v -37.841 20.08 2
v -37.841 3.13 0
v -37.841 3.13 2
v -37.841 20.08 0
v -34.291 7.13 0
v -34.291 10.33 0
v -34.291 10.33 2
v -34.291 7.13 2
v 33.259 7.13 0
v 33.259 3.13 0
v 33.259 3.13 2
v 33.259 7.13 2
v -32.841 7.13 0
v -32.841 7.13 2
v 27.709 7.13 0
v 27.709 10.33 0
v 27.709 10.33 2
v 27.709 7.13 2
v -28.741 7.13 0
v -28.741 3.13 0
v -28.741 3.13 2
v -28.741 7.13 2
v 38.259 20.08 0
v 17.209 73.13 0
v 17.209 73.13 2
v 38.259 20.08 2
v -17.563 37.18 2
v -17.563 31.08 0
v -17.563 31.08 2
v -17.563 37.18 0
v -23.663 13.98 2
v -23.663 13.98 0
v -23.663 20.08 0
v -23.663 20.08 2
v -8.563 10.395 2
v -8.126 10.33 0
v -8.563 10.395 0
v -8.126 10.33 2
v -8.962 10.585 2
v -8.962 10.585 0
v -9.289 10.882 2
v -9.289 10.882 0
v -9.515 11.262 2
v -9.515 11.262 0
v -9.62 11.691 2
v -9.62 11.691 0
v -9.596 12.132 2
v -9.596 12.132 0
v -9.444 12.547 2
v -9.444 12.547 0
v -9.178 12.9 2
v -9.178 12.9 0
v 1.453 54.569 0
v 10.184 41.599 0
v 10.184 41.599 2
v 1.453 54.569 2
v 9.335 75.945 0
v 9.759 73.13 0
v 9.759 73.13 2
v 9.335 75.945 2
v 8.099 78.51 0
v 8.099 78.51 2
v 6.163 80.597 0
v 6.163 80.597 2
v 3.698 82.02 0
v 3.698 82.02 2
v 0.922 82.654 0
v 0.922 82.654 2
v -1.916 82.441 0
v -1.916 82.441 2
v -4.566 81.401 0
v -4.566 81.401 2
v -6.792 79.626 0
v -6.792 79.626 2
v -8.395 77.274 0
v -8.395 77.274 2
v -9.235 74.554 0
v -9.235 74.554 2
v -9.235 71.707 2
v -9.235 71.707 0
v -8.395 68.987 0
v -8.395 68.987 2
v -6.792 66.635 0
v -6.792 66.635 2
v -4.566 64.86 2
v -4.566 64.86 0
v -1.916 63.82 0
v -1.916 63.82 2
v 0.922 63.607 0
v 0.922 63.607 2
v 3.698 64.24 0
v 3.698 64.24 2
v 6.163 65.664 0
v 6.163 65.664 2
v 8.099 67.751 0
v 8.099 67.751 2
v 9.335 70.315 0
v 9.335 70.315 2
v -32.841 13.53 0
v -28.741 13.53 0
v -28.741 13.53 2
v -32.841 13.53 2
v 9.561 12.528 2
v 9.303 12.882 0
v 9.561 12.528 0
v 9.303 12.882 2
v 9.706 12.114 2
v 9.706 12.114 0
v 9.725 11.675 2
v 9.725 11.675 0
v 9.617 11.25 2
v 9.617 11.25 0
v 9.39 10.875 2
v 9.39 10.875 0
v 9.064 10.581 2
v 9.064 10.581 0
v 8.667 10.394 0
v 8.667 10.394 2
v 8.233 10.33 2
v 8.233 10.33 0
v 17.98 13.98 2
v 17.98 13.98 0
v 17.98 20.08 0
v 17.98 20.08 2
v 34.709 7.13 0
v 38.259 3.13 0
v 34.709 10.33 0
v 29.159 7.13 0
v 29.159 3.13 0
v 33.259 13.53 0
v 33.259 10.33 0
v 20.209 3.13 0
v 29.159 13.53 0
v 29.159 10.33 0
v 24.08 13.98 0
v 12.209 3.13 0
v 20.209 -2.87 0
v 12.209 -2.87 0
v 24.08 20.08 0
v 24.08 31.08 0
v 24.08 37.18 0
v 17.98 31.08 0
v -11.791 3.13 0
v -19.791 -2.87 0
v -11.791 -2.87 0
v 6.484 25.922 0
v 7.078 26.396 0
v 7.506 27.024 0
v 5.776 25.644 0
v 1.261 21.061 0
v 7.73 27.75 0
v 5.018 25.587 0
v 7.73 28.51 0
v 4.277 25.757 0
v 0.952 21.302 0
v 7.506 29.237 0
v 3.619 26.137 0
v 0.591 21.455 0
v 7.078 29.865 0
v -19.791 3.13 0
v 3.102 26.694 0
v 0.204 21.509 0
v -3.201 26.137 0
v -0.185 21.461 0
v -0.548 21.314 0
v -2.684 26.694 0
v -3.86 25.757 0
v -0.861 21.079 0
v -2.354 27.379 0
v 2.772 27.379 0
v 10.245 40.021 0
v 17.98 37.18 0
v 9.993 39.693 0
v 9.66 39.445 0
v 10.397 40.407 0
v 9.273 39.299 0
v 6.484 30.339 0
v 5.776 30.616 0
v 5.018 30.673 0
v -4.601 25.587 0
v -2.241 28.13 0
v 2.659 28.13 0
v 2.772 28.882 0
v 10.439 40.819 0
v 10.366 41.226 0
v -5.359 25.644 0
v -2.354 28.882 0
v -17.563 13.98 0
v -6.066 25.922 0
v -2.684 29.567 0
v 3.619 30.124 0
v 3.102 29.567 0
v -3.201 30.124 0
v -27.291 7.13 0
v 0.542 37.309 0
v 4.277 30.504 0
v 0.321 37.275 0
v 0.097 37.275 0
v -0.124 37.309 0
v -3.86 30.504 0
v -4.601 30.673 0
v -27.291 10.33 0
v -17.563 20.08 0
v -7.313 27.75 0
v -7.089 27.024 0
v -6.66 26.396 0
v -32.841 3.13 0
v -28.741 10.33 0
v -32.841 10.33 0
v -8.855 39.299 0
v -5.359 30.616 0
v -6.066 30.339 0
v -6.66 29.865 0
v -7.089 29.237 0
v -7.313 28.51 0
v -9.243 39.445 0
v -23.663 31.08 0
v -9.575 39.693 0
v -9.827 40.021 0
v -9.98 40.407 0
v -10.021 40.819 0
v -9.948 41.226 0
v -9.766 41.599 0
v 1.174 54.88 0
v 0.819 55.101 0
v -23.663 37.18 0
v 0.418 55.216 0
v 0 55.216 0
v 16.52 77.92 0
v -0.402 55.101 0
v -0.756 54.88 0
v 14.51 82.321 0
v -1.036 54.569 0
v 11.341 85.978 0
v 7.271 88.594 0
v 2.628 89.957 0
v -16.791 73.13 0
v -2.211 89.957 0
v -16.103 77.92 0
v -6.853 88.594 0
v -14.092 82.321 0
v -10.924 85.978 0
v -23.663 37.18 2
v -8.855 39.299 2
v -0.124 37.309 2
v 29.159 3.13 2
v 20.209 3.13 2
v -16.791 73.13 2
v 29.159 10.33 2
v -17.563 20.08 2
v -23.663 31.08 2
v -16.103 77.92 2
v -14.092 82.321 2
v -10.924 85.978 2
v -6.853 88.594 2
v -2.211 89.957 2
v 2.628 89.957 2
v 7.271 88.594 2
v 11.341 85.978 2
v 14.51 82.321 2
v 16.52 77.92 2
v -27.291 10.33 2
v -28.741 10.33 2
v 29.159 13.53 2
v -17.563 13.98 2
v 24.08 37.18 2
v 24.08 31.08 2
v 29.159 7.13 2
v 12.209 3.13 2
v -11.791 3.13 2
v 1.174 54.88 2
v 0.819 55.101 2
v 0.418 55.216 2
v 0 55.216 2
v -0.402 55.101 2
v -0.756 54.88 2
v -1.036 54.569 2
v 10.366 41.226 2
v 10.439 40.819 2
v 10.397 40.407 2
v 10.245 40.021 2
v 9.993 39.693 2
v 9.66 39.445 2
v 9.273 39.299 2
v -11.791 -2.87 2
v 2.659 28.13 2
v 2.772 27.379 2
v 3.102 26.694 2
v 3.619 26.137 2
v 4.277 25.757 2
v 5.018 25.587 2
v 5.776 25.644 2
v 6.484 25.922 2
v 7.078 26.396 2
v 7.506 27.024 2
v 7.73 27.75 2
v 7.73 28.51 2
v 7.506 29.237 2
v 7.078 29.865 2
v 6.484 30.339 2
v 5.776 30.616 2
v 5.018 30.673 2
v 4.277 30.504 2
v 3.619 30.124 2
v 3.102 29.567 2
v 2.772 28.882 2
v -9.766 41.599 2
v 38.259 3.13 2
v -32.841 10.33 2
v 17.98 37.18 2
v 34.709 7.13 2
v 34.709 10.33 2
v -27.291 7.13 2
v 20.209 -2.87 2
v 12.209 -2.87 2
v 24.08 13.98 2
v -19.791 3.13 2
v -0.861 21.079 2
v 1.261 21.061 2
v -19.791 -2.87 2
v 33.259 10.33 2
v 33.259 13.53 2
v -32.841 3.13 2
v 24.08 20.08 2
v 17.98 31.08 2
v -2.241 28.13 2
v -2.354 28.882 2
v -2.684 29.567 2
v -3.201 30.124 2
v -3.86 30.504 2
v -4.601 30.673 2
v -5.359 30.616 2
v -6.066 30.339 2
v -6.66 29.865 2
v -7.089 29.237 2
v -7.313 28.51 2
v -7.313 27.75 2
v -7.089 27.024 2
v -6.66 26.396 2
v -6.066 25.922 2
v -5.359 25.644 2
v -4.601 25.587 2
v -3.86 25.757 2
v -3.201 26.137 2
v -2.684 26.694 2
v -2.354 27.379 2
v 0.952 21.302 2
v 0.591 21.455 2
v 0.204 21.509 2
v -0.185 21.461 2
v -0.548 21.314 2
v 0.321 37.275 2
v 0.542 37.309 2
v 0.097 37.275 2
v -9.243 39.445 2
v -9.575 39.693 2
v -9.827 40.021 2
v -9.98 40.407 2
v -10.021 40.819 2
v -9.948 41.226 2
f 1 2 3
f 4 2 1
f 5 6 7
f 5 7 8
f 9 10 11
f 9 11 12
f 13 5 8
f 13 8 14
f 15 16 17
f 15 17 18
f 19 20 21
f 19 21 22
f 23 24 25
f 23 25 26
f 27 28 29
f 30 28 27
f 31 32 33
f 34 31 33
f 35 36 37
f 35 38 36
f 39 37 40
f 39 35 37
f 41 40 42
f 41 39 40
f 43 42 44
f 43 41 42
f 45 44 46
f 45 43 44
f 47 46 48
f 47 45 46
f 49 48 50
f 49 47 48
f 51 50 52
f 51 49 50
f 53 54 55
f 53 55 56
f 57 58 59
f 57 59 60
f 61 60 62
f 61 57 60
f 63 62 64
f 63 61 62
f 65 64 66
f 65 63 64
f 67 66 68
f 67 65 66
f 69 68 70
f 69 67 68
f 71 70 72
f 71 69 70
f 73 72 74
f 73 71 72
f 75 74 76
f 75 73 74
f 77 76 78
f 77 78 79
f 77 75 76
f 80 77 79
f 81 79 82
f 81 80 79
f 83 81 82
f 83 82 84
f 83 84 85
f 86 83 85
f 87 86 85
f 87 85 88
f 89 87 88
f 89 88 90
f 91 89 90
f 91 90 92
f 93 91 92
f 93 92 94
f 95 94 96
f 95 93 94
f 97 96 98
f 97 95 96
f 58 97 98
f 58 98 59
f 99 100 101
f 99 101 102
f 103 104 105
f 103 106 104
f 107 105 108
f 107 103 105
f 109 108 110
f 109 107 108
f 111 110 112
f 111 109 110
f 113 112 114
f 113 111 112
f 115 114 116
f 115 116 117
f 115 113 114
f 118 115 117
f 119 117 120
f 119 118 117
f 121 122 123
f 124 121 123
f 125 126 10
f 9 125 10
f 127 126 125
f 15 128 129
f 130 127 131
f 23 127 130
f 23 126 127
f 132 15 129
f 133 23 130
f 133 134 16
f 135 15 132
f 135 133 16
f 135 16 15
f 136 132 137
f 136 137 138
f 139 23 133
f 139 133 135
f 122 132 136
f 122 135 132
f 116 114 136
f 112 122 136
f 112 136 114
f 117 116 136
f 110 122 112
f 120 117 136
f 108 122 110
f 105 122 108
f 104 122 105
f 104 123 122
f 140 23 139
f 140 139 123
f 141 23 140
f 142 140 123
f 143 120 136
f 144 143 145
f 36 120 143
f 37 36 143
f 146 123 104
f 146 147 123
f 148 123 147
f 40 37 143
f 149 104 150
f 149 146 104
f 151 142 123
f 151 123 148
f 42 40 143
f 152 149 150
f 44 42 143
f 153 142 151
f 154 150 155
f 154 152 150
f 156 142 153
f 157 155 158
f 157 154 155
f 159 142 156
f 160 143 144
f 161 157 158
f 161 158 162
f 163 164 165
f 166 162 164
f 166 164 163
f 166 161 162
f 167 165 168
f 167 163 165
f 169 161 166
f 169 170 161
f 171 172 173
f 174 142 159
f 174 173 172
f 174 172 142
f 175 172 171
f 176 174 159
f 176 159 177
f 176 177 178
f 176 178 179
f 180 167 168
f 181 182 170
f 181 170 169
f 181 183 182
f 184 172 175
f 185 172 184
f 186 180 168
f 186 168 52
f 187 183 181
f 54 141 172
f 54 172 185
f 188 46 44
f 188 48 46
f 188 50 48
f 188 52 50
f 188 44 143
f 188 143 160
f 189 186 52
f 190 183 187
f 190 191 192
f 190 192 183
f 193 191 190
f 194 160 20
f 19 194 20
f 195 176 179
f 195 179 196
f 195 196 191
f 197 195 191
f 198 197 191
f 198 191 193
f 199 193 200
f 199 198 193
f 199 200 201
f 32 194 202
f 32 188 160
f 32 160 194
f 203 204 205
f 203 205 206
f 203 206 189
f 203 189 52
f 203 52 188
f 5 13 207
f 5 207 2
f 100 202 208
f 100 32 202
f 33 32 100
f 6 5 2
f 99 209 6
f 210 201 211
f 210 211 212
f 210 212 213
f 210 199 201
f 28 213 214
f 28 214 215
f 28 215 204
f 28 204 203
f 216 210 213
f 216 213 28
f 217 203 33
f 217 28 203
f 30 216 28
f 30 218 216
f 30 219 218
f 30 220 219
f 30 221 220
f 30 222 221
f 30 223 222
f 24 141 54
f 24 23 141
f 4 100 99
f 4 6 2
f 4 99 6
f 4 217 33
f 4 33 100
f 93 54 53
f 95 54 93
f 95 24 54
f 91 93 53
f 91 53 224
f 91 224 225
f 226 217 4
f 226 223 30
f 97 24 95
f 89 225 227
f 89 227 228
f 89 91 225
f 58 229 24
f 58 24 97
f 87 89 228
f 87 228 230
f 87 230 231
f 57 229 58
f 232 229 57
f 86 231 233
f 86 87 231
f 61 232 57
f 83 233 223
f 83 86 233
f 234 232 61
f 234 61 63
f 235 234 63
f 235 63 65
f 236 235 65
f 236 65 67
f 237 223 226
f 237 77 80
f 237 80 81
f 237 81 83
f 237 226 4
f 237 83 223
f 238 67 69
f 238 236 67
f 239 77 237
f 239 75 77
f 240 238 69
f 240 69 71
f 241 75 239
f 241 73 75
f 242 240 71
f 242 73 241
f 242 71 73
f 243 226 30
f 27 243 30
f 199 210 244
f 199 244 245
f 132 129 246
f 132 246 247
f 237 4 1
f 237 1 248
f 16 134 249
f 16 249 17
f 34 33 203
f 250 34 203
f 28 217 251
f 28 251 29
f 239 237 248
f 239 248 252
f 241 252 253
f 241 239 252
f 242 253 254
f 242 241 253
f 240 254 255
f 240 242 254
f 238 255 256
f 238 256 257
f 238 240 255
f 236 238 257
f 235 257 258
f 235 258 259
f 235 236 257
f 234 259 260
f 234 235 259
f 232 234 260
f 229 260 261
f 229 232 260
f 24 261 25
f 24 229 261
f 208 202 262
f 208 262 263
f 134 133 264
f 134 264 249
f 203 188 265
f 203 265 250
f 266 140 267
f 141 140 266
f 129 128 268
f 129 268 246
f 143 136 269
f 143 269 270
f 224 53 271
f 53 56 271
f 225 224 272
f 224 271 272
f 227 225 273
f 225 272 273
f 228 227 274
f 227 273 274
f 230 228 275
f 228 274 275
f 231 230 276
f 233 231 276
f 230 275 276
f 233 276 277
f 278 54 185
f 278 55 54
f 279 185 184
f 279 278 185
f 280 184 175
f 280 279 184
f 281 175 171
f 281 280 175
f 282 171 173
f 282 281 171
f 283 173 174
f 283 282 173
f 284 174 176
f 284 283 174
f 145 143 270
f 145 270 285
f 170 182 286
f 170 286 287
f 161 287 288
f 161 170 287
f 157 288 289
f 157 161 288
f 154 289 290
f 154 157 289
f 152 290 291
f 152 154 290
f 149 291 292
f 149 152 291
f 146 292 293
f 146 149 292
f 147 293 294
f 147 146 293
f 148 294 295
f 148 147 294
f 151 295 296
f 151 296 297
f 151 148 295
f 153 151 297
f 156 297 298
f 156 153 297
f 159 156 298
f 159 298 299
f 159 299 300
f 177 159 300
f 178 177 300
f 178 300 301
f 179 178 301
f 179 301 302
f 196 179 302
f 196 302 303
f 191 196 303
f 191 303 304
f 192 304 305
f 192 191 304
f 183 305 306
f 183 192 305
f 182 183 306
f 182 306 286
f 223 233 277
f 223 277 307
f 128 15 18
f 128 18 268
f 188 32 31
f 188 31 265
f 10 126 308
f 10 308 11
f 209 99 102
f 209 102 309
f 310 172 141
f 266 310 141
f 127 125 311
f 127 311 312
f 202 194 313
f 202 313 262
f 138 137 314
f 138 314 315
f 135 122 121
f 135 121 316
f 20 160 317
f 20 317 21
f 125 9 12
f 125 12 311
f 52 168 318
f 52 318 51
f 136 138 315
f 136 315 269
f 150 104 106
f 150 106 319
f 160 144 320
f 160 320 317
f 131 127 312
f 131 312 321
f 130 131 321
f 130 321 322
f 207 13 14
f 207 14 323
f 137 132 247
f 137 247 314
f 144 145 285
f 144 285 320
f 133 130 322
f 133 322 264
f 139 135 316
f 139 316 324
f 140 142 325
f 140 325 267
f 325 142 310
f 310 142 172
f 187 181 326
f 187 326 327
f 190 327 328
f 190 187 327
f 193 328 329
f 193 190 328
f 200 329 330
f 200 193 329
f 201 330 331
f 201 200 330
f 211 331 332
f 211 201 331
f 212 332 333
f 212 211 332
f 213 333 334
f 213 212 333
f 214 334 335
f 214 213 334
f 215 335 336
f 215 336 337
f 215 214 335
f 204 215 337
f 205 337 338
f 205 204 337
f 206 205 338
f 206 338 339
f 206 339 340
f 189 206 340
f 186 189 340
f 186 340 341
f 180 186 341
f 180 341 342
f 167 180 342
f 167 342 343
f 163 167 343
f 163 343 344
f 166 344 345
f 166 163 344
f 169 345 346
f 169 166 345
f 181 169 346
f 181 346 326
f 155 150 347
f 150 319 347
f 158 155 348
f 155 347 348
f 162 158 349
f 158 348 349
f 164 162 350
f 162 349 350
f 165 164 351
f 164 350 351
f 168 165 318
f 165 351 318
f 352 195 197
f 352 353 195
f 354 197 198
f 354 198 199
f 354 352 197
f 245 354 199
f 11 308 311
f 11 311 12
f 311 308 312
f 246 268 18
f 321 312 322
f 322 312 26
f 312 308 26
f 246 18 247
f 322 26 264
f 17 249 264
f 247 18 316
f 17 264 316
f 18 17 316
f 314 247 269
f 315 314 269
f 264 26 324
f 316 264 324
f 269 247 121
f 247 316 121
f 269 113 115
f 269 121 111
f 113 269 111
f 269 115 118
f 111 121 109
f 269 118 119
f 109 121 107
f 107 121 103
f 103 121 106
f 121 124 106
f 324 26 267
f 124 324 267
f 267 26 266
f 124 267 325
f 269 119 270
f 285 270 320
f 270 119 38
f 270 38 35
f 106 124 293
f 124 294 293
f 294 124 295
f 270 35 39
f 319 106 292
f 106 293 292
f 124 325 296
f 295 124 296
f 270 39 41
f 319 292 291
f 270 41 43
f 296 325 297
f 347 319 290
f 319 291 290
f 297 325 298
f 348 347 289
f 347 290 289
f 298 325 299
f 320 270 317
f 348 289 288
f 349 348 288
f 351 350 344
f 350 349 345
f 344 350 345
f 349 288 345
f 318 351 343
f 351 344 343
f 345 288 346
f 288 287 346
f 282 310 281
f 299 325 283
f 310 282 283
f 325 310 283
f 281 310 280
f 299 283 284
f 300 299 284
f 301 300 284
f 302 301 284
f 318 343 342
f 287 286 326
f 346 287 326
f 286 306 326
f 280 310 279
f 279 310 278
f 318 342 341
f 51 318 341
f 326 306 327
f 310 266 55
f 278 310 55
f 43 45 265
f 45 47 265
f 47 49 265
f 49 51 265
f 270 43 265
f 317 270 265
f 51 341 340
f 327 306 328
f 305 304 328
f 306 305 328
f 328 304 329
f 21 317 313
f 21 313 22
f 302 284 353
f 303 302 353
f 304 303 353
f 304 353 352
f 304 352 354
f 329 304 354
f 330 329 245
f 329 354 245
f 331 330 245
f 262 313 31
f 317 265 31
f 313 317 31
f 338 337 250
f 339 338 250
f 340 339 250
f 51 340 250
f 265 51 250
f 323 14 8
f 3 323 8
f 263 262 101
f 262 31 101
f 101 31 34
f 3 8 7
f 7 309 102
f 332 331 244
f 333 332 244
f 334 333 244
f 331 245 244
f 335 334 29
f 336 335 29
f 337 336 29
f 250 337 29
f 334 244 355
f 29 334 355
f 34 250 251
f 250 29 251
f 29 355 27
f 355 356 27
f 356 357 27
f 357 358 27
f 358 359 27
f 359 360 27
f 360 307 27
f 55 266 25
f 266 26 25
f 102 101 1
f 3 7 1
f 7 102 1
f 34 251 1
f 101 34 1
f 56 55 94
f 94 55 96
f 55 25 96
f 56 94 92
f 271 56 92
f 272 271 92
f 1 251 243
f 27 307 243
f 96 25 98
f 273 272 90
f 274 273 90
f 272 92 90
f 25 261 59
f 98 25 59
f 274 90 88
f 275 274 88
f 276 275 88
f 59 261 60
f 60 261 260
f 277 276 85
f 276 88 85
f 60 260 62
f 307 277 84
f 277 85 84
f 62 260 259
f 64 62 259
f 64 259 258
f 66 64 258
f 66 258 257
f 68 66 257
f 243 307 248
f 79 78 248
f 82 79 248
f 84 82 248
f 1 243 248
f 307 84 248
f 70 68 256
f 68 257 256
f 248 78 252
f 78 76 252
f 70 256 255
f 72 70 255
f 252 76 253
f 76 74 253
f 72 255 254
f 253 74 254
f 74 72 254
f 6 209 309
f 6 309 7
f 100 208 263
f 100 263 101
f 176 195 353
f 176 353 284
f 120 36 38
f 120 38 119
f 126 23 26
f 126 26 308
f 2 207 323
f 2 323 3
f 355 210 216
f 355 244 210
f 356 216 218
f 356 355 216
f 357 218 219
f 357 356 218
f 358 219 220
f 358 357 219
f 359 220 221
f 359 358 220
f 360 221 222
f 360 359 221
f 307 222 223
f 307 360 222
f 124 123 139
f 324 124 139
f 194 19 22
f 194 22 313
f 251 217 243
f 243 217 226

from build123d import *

# Parameters (mm, degrees)
SKETCH_1_R      = 9.55
SKETCH_1_R_2    = 2.55
SKETCH_1_W      = 6.1
SKETCH_1_H      = 6.1
EXTRUDE_1_DEPTH = 2
FILLET_3_R      = 1.5


with BuildPart() as part:
    # 草图1 → 凸台-拉伸1 (new body)
    with BuildSketch(Plane.XY):
        with BuildLine():
            Line((-28.741188564, 3.13029316), (-28.741188564, 7.13029316))
            Line((-28.741188564, 7.13029316), (-27.291188564, 7.13029316))
            Line((-27.291188564, 7.13029316), (-27.291188564, 10.33029316))
            Line((-27.291188564, 10.33029316), (-28.741188564, 10.33029316))
            Line((-28.741188564, 10.33029316), (-28.741188564, 13.53029316))
            Line((-28.741188564, 13.53029316), (-32.841188564, 13.53029316))
            Line((-32.841188564, 13.53029316), (-32.841188564, 10.33029316))
            Line((-32.841188564, 10.33029316), (-34.291188564, 10.33029316))
            Line((-34.291188564, 10.33029316), (-34.291188564, 7.13029316))
            Line((-34.291188564, 7.13029316), (-32.841188564, 7.13029316))
            Line((-32.841188564, 7.13029316), (-32.841188564, 3.13029316))
            Line((-32.841188564, 3.13029316), (-37.841188564, 3.13029316))
            Line((-37.841188564, 3.13029316), (-37.841188564, 20.08029316))
            Line((-37.841188564, 20.08029316), (-16.791188564, 73.13029316))
            ThreePointArc((-16.791188564, 73.13029316), (0.208811436, 90.13029316), (17.208811436, 73.13029316))
            Line((17.208811436, 73.13029316), (38.258811436, 20.08029316))
            Line((38.258811436, 20.08029316), (38.258811436, 3.13029316))
            Line((38.258811436, 3.13029316), (33.258811436, 3.13029316))
            Line((33.258811436, 3.13029316), (33.258811436, 7.13029316))
            Line((33.258811436, 7.13029316), (34.708811436, 7.13029316))
            Line((34.708811436, 7.13029316), (34.708811436, 10.33029316))
            Line((34.708811436, 10.33029316), (33.258811436, 10.33029316))
            Line((33.258811436, 10.33029316), (33.258811436, 13.53029316))
            Line((33.258811436, 13.53029316), (29.158811436, 13.53029316))
            Line((29.158811436, 13.53029316), (29.158811436, 10.33029316))
            Line((29.158811436, 10.33029316), (27.708811436, 10.33029316))
            Line((27.708811436, 10.33029316), (27.708811436, 7.13029316))
            Line((27.708811436, 7.13029316), (29.158811436, 7.13029316))
            Line((29.158811436, 7.13029316), (29.158811436, 3.13029316))
            Line((29.158811436, 3.13029316), (20.208811436, 3.13029316))
            Line((20.208811436, 3.13029316), (20.208811436, -2.86970684))
            Line((20.208811436, -2.86970684), (12.208811436, -2.86970684))
            Line((12.208811436, -2.86970684), (12.208811436, 3.13029316))
            Line((12.208811436, 3.13029316), (-11.791188564, 3.13029316))
            Line((-11.791188564, 3.13029316), (-11.791188564, -2.86970684))
            Line((-11.791188564, -2.86970684), (-19.791188564, -2.86970684))
            Line((-19.791188564, -2.86970684), (-19.791188564, 3.13029316))
            Line((-19.791188564, 3.13029316), (-28.741188564, 3.13029316))
        make_face()
        with Locations((0.208811436, 73.13029316)):
            Circle(SKETCH_1_R, mode=Mode.SUBTRACT)
        with Locations((-4.791188564, 28.13029316)):
            Circle(SKETCH_1_R_2, mode=Mode.SUBTRACT)
        with Locations(Location((5.208811436, 28.13029316, 0), (0, 0, 180))):
            Circle(SKETCH_1_R_2, mode=Mode.SUBTRACT)
        with Locations((-20.612527992, 34.13029316)):
            Rectangle(SKETCH_1_W, SKETCH_1_H, mode=Mode.SUBTRACT)
        with Locations((-20.612527992, 17.03029316)):
            Rectangle(SKETCH_1_W, SKETCH_1_H, mode=Mode.SUBTRACT)
        Polygon((0.208811436, 22.13029316), (-11.791188564, 10.33029316), (11.812144769, 10.33029316), align=None, mode=Mode.SUBTRACT)
        with Locations((21.030150863, 34.13029316)):
            Rectangle(SKETCH_1_W, SKETCH_1_H, mode=Mode.SUBTRACT)
        with Locations((21.030150863, 17.03029316)):
            Rectangle(SKETCH_1_W, SKETCH_1_H, mode=Mode.SUBTRACT)
        Polygon((0.208811436, 56.417251186), (-10.987657951, 39.784470466), (0.208811436, 37.232850696), (11.405280822, 39.784470466), align=None, mode=Mode.SUBTRACT)
    extrude(amount=EXTRUDE_1_DEPTH)

    # 圆角3
    fillet_3_edges = [part.edges().sort_by_distance(p)[0] for p in [
        (11.405280822, 39.784470466, 1),
        (0.208811436, 56.417251186, 1),
        (-10.987657951, 39.784470466, 1),
        (0.208811436, 37.232850696, 1),
        (11.812144769, 10.33029316, 1),
        (0.208811436, 22.13029316, 1),
        (-11.791188564, 10.33029316, 1),
    ]]
    fillet(fillet_3_edges, radius=FILLET_3_R)


solid = part.part
